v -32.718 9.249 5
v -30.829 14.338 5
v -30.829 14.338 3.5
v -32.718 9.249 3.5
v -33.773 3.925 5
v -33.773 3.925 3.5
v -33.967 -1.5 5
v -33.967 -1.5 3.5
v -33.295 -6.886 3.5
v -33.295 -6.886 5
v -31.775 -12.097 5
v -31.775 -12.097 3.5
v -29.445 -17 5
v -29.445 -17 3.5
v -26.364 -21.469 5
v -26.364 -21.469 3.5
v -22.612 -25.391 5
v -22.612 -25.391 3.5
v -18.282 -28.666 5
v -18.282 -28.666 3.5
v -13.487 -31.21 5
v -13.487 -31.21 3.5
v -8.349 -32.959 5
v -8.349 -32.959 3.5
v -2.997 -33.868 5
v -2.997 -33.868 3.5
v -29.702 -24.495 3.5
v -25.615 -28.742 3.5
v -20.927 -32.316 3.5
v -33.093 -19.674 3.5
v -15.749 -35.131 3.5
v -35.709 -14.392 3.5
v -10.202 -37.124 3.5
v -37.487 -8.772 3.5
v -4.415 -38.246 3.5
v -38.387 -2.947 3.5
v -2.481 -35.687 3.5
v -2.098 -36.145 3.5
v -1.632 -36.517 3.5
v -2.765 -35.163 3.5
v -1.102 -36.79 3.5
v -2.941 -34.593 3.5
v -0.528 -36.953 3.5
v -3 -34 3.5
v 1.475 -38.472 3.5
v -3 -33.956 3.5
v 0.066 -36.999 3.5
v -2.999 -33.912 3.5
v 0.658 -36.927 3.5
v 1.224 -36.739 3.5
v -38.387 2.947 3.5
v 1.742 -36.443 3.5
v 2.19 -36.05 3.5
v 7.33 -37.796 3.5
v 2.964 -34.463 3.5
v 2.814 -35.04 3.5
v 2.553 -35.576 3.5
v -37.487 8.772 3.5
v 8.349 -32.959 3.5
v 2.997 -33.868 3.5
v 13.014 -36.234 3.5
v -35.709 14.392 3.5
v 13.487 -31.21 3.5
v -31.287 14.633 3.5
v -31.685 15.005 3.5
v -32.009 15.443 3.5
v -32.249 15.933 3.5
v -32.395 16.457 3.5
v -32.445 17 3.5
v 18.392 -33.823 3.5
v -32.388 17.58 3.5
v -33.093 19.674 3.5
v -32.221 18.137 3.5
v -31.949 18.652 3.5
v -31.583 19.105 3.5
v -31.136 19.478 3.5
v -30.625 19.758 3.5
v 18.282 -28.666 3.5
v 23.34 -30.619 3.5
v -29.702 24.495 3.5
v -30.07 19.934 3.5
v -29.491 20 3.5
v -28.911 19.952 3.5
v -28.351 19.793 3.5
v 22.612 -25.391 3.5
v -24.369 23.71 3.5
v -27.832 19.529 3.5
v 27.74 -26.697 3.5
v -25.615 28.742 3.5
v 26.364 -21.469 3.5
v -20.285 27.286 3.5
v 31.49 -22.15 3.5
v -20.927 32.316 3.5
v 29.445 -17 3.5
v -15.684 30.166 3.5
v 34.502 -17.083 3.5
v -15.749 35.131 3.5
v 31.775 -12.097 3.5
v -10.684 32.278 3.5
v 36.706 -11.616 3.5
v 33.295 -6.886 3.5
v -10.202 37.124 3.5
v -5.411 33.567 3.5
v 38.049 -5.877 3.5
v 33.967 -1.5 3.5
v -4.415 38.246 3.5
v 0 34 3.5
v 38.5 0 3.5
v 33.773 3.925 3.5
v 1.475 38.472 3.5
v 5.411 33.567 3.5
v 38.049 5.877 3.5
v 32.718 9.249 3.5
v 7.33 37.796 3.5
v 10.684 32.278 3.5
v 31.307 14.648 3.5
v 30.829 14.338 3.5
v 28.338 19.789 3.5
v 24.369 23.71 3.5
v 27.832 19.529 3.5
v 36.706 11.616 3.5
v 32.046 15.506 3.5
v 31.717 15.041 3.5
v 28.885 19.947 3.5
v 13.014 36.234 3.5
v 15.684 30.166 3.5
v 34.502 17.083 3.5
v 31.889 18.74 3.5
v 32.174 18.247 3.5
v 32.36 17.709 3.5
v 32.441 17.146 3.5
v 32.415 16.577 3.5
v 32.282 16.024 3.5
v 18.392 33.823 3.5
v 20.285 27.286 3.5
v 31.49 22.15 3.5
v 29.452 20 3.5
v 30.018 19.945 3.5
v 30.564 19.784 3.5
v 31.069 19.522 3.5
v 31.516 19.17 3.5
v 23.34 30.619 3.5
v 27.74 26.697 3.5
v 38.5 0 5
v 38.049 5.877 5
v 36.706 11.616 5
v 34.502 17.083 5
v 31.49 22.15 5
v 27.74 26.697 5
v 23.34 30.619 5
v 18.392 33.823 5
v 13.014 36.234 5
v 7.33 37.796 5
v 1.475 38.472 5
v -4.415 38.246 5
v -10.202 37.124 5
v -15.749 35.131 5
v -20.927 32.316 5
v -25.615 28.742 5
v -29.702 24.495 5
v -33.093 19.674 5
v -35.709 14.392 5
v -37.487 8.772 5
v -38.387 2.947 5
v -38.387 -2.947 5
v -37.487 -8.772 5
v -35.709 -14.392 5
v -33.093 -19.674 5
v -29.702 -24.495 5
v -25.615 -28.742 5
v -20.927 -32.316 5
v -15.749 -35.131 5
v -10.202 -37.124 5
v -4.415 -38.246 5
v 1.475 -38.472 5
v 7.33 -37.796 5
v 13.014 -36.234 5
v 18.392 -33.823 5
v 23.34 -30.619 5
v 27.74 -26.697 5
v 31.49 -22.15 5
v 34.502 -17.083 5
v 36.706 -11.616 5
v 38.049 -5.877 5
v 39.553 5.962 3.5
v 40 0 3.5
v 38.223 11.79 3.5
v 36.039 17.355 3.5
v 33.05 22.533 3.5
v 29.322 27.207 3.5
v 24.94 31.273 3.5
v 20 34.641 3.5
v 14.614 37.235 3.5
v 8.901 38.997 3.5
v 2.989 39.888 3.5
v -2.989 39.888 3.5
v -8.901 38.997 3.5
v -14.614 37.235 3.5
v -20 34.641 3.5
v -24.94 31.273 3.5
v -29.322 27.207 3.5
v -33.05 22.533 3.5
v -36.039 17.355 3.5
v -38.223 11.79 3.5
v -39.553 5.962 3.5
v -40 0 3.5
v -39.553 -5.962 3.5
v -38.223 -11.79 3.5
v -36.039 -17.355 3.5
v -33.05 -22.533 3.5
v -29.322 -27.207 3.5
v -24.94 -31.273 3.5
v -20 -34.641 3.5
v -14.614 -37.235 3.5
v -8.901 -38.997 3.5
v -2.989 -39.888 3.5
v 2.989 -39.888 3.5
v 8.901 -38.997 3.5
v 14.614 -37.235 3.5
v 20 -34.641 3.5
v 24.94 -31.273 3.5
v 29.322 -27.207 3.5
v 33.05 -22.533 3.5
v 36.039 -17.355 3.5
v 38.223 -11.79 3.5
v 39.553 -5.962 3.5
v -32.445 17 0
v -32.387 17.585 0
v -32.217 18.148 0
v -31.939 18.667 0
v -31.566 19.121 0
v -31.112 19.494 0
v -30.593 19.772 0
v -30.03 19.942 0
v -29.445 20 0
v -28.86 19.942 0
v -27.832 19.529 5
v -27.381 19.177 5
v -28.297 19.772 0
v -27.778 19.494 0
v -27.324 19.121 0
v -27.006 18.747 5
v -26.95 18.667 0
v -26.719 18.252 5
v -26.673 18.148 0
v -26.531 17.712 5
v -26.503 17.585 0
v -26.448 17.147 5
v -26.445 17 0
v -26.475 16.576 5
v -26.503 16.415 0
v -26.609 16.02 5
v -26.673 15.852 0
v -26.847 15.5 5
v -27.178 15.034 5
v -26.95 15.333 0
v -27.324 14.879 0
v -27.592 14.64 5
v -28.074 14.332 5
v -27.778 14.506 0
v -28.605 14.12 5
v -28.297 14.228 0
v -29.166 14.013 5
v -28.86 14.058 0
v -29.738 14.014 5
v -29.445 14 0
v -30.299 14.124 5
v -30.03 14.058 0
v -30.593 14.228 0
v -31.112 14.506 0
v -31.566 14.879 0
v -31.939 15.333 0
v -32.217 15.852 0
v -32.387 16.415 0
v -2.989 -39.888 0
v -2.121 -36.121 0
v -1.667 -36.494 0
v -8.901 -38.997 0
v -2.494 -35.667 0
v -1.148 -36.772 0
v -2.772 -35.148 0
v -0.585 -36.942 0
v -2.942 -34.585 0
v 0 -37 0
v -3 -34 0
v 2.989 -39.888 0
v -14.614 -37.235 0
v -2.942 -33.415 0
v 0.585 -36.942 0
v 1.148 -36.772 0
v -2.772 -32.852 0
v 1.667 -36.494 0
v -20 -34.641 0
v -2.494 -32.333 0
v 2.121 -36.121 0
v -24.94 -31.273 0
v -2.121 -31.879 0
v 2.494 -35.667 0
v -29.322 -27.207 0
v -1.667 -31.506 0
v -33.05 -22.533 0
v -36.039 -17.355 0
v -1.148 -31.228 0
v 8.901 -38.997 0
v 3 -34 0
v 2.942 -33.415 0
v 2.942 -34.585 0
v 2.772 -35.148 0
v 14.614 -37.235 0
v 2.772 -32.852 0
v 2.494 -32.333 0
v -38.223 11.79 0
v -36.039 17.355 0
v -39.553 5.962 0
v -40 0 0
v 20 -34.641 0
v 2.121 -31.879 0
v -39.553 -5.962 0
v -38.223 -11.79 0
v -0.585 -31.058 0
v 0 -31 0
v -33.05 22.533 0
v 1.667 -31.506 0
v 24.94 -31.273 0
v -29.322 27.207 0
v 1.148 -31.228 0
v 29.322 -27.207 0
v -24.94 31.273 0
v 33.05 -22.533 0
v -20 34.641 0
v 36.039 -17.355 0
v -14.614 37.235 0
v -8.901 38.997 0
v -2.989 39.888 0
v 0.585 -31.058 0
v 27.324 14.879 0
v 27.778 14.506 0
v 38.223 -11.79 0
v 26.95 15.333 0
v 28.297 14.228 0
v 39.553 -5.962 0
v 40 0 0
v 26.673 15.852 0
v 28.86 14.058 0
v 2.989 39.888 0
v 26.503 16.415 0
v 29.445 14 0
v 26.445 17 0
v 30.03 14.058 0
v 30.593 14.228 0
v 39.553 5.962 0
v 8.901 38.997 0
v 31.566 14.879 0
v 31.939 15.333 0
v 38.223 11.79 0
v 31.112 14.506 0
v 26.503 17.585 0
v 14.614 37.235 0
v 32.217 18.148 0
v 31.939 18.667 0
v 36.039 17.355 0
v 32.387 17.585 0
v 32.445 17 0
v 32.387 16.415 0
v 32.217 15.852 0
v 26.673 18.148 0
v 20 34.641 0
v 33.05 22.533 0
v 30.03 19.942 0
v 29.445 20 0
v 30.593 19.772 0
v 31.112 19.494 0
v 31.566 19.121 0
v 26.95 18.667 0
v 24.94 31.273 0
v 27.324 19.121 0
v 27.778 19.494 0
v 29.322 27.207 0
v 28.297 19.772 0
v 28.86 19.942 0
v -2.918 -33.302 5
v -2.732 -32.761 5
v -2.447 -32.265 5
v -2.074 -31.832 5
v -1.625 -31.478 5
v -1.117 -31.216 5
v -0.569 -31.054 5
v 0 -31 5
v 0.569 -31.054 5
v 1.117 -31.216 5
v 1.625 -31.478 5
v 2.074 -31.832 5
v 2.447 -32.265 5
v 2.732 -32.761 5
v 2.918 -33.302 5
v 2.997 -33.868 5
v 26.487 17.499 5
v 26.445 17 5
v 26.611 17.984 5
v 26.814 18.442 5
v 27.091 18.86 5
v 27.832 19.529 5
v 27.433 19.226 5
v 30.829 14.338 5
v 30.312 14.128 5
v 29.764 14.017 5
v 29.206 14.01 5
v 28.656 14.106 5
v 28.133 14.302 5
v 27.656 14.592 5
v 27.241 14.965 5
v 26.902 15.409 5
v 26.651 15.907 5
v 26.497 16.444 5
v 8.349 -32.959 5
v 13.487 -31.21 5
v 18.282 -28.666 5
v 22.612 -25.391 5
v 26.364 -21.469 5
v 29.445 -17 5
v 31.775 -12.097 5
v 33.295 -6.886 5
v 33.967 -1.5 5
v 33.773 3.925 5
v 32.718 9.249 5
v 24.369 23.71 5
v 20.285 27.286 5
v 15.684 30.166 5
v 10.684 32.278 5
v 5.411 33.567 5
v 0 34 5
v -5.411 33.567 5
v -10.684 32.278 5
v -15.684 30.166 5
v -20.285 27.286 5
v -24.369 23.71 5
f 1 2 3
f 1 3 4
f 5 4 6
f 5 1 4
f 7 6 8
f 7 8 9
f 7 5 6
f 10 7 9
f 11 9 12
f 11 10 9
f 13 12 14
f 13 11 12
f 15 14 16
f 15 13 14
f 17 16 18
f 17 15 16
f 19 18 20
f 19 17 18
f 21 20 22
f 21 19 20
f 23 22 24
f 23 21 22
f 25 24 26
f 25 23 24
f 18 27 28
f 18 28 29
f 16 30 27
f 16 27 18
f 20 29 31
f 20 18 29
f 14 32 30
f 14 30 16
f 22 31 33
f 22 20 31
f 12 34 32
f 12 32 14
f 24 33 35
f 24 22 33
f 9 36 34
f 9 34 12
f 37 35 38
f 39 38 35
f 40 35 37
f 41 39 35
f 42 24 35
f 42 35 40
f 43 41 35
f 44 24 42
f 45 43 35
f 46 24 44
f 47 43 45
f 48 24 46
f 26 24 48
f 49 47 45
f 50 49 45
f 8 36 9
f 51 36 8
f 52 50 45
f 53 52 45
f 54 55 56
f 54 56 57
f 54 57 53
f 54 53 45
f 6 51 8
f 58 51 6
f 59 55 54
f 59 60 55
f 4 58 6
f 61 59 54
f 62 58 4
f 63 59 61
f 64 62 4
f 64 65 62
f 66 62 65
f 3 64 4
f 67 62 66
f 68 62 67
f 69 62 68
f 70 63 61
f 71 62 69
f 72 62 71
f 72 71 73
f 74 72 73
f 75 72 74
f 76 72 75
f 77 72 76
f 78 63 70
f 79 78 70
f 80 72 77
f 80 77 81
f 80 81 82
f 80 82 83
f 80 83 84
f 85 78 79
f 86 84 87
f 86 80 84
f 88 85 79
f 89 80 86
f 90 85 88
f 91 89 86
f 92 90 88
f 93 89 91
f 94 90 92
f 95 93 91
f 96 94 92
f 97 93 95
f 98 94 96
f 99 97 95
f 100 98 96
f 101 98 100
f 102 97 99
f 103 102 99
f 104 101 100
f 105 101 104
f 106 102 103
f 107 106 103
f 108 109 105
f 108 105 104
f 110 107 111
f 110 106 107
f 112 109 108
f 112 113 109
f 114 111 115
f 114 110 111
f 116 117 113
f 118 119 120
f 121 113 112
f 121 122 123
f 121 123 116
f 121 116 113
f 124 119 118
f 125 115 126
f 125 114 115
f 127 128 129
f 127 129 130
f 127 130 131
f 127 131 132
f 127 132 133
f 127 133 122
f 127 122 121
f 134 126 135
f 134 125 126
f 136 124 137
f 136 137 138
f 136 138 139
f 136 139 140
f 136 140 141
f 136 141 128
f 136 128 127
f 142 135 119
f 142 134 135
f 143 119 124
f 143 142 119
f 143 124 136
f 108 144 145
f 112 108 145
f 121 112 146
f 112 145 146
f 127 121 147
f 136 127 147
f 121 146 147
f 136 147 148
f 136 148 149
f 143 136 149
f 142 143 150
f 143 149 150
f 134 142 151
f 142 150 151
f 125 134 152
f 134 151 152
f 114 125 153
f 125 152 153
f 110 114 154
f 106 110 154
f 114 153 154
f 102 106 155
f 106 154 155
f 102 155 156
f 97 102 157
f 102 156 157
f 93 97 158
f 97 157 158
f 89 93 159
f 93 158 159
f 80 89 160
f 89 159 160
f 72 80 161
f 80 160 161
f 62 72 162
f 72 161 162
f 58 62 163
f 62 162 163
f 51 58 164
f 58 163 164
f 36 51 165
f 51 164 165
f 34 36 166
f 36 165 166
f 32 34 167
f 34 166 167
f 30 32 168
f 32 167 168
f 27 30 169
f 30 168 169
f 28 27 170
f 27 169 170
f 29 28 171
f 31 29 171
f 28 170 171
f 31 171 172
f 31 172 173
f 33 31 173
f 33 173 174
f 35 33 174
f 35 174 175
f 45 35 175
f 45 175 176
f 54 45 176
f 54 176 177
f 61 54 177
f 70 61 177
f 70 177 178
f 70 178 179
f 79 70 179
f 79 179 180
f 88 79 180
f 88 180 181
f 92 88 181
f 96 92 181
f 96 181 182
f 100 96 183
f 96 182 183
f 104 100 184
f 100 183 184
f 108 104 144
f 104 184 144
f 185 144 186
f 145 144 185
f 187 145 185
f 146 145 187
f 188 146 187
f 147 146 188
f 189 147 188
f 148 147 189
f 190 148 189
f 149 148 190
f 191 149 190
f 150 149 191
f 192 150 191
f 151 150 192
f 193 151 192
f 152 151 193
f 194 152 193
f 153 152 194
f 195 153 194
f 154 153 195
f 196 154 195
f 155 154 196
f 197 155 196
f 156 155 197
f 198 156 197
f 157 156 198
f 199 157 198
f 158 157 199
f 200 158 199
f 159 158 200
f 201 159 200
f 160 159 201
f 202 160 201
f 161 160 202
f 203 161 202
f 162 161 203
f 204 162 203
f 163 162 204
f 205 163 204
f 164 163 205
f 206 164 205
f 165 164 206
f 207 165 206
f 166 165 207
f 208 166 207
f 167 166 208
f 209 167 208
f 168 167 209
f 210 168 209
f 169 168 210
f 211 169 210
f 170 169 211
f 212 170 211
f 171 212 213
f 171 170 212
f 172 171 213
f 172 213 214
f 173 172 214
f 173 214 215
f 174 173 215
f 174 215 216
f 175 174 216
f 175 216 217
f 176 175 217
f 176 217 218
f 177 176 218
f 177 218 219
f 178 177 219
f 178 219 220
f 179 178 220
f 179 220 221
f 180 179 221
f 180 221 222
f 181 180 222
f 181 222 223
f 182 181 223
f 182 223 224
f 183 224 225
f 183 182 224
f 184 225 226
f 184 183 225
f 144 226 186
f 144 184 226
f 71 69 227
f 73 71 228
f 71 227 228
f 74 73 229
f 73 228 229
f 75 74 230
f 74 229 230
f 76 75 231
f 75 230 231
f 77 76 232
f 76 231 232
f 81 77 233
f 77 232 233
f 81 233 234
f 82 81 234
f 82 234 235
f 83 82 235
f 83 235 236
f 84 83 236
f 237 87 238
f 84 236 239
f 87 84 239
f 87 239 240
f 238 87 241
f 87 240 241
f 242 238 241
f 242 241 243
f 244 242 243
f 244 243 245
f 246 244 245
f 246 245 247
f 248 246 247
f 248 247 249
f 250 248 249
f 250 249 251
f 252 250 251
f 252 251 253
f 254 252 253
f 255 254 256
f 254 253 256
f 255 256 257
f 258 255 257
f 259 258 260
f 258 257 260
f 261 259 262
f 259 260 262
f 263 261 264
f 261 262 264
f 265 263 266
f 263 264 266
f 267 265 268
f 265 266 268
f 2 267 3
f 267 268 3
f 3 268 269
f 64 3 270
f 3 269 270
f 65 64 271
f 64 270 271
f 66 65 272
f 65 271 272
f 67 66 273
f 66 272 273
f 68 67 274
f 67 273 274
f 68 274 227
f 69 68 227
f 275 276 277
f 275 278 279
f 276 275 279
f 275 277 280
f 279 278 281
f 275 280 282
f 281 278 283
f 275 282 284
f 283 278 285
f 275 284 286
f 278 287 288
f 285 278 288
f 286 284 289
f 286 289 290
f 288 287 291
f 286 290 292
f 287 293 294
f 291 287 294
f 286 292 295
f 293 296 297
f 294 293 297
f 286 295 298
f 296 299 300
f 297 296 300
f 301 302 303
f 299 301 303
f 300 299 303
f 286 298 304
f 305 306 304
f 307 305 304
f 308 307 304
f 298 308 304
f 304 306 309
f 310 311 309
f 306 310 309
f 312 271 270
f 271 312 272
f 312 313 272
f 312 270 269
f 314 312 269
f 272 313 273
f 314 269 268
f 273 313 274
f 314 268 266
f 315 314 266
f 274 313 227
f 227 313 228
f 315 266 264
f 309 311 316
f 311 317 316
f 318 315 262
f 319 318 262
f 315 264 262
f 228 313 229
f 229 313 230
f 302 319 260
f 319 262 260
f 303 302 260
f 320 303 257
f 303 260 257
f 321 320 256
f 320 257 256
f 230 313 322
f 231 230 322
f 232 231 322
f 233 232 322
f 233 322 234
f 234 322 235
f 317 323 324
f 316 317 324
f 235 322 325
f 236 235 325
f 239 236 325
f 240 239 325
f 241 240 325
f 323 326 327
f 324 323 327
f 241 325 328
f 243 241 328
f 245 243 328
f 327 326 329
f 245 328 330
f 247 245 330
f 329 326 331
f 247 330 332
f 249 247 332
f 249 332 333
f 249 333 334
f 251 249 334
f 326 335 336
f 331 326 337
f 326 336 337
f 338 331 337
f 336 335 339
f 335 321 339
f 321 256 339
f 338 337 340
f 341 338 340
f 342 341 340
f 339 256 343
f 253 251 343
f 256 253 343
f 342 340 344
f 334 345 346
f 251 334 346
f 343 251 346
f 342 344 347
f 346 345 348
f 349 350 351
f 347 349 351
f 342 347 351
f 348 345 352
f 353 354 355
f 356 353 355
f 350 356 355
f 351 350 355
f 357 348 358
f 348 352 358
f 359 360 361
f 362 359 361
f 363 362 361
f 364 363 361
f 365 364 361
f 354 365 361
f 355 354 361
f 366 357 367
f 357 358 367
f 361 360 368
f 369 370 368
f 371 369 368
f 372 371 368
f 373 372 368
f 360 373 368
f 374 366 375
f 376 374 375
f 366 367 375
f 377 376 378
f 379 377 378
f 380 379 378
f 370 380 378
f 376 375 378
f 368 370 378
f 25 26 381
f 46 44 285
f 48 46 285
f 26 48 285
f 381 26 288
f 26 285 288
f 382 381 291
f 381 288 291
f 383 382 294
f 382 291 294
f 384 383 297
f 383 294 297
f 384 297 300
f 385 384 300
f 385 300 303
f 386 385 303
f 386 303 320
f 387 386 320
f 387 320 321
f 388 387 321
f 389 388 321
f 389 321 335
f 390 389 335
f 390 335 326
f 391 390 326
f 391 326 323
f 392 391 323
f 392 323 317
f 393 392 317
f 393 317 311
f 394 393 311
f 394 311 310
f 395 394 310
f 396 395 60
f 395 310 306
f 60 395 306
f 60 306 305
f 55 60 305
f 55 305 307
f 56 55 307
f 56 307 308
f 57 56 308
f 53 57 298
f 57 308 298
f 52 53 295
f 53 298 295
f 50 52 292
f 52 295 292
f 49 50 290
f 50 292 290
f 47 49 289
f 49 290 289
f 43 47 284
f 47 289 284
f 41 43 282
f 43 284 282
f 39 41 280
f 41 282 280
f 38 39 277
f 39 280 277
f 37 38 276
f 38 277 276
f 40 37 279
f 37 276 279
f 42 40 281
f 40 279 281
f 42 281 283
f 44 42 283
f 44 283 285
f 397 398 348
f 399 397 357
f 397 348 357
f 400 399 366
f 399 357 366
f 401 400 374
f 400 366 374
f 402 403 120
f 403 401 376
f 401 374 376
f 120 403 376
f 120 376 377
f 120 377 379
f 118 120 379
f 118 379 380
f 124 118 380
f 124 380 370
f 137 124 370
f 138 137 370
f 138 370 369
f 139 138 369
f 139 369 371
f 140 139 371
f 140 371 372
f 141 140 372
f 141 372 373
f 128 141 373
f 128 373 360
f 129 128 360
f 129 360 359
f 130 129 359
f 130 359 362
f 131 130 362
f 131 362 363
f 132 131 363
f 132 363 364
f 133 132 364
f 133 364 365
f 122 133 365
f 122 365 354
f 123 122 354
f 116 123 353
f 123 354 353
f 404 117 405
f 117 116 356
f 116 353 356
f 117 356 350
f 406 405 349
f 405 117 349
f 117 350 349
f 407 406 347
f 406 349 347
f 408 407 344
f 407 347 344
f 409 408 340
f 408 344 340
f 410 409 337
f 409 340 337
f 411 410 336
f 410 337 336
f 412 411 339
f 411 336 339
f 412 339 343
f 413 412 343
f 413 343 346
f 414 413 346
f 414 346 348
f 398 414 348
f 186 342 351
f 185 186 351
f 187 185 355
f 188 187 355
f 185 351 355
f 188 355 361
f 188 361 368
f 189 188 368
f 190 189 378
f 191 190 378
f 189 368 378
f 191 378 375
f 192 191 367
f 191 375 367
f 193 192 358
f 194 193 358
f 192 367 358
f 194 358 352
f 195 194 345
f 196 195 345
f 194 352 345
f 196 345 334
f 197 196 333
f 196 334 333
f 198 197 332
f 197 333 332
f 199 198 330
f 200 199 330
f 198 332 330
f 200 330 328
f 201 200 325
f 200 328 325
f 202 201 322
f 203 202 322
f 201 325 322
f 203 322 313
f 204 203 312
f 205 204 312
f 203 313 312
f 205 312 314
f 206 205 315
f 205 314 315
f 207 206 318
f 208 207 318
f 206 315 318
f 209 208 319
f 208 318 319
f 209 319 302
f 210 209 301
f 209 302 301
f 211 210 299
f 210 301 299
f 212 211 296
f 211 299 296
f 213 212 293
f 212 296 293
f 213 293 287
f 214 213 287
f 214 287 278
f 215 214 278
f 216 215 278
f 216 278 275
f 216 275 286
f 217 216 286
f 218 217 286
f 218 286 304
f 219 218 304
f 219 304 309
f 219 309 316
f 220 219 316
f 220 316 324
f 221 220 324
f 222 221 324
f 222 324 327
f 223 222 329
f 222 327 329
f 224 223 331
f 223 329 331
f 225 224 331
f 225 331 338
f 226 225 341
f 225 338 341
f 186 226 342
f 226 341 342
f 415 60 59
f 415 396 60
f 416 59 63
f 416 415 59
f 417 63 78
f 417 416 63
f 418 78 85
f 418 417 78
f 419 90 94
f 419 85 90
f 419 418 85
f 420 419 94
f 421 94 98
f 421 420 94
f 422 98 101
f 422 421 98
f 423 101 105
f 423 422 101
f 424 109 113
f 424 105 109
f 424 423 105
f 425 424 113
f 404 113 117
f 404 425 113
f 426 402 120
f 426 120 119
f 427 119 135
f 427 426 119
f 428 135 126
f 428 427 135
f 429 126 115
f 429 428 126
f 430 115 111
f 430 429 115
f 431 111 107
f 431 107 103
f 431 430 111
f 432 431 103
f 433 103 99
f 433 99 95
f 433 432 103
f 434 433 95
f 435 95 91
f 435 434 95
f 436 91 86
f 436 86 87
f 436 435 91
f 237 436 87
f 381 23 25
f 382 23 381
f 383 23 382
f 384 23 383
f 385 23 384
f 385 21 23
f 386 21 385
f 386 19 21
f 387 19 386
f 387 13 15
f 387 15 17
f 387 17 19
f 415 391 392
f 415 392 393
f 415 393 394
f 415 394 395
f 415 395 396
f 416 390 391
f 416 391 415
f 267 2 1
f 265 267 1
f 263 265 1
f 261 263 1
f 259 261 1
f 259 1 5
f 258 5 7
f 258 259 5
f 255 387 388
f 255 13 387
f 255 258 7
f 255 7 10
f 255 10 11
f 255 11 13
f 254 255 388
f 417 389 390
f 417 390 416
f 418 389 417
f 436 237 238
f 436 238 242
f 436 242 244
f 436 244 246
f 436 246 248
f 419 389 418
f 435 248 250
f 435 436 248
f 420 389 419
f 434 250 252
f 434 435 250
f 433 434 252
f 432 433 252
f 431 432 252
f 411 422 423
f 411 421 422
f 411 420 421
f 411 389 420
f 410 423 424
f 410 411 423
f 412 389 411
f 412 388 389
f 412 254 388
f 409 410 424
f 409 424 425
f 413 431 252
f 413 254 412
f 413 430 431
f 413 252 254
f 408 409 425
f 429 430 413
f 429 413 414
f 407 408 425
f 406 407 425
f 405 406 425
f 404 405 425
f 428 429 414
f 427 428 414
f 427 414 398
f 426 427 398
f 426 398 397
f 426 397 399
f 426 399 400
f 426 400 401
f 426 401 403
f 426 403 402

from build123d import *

# Parameters (mm, degrees)
F0_R     = 40
F1_DEPTH = 5
F2_SIZE  = 1.5
F3_R     = 38.5
F3_R_2   = 34
F4_DEPTH = 1.5
F6_D     = 6
F6_DEPTH = 10


with BuildPart() as f1:
    # F0 (on Top) → F1 (new body)
    with BuildSketch(Plane.XY):
        Circle(F0_R)
    extrude(amount=F1_DEPTH)

    # F2
    f2_edges = [f1.edges().sort_by_distance(p)[0] for p in [
        (-40, 0, 5),
    ]]
    chamfer(f2_edges, length=F2_SIZE)

    # F3 (on face) → F4 (cut)
    with BuildSketch(Plane.XY.offset(5)):
        Circle(F3_R)
        Circle(F3_R_2, mode=Mode.SUBTRACT)
    extrude(amount=-F4_DEPTH, mode=Mode.SUBTRACT)

    # F6
    with Locations(Plane.XY.offset(5)):
        with Locations((29.444864, 17), (0, -34), (-29.444864, 17)):
            Hole(F6_D / 2, depth=F6_DEPTH)


solid = f1.part
